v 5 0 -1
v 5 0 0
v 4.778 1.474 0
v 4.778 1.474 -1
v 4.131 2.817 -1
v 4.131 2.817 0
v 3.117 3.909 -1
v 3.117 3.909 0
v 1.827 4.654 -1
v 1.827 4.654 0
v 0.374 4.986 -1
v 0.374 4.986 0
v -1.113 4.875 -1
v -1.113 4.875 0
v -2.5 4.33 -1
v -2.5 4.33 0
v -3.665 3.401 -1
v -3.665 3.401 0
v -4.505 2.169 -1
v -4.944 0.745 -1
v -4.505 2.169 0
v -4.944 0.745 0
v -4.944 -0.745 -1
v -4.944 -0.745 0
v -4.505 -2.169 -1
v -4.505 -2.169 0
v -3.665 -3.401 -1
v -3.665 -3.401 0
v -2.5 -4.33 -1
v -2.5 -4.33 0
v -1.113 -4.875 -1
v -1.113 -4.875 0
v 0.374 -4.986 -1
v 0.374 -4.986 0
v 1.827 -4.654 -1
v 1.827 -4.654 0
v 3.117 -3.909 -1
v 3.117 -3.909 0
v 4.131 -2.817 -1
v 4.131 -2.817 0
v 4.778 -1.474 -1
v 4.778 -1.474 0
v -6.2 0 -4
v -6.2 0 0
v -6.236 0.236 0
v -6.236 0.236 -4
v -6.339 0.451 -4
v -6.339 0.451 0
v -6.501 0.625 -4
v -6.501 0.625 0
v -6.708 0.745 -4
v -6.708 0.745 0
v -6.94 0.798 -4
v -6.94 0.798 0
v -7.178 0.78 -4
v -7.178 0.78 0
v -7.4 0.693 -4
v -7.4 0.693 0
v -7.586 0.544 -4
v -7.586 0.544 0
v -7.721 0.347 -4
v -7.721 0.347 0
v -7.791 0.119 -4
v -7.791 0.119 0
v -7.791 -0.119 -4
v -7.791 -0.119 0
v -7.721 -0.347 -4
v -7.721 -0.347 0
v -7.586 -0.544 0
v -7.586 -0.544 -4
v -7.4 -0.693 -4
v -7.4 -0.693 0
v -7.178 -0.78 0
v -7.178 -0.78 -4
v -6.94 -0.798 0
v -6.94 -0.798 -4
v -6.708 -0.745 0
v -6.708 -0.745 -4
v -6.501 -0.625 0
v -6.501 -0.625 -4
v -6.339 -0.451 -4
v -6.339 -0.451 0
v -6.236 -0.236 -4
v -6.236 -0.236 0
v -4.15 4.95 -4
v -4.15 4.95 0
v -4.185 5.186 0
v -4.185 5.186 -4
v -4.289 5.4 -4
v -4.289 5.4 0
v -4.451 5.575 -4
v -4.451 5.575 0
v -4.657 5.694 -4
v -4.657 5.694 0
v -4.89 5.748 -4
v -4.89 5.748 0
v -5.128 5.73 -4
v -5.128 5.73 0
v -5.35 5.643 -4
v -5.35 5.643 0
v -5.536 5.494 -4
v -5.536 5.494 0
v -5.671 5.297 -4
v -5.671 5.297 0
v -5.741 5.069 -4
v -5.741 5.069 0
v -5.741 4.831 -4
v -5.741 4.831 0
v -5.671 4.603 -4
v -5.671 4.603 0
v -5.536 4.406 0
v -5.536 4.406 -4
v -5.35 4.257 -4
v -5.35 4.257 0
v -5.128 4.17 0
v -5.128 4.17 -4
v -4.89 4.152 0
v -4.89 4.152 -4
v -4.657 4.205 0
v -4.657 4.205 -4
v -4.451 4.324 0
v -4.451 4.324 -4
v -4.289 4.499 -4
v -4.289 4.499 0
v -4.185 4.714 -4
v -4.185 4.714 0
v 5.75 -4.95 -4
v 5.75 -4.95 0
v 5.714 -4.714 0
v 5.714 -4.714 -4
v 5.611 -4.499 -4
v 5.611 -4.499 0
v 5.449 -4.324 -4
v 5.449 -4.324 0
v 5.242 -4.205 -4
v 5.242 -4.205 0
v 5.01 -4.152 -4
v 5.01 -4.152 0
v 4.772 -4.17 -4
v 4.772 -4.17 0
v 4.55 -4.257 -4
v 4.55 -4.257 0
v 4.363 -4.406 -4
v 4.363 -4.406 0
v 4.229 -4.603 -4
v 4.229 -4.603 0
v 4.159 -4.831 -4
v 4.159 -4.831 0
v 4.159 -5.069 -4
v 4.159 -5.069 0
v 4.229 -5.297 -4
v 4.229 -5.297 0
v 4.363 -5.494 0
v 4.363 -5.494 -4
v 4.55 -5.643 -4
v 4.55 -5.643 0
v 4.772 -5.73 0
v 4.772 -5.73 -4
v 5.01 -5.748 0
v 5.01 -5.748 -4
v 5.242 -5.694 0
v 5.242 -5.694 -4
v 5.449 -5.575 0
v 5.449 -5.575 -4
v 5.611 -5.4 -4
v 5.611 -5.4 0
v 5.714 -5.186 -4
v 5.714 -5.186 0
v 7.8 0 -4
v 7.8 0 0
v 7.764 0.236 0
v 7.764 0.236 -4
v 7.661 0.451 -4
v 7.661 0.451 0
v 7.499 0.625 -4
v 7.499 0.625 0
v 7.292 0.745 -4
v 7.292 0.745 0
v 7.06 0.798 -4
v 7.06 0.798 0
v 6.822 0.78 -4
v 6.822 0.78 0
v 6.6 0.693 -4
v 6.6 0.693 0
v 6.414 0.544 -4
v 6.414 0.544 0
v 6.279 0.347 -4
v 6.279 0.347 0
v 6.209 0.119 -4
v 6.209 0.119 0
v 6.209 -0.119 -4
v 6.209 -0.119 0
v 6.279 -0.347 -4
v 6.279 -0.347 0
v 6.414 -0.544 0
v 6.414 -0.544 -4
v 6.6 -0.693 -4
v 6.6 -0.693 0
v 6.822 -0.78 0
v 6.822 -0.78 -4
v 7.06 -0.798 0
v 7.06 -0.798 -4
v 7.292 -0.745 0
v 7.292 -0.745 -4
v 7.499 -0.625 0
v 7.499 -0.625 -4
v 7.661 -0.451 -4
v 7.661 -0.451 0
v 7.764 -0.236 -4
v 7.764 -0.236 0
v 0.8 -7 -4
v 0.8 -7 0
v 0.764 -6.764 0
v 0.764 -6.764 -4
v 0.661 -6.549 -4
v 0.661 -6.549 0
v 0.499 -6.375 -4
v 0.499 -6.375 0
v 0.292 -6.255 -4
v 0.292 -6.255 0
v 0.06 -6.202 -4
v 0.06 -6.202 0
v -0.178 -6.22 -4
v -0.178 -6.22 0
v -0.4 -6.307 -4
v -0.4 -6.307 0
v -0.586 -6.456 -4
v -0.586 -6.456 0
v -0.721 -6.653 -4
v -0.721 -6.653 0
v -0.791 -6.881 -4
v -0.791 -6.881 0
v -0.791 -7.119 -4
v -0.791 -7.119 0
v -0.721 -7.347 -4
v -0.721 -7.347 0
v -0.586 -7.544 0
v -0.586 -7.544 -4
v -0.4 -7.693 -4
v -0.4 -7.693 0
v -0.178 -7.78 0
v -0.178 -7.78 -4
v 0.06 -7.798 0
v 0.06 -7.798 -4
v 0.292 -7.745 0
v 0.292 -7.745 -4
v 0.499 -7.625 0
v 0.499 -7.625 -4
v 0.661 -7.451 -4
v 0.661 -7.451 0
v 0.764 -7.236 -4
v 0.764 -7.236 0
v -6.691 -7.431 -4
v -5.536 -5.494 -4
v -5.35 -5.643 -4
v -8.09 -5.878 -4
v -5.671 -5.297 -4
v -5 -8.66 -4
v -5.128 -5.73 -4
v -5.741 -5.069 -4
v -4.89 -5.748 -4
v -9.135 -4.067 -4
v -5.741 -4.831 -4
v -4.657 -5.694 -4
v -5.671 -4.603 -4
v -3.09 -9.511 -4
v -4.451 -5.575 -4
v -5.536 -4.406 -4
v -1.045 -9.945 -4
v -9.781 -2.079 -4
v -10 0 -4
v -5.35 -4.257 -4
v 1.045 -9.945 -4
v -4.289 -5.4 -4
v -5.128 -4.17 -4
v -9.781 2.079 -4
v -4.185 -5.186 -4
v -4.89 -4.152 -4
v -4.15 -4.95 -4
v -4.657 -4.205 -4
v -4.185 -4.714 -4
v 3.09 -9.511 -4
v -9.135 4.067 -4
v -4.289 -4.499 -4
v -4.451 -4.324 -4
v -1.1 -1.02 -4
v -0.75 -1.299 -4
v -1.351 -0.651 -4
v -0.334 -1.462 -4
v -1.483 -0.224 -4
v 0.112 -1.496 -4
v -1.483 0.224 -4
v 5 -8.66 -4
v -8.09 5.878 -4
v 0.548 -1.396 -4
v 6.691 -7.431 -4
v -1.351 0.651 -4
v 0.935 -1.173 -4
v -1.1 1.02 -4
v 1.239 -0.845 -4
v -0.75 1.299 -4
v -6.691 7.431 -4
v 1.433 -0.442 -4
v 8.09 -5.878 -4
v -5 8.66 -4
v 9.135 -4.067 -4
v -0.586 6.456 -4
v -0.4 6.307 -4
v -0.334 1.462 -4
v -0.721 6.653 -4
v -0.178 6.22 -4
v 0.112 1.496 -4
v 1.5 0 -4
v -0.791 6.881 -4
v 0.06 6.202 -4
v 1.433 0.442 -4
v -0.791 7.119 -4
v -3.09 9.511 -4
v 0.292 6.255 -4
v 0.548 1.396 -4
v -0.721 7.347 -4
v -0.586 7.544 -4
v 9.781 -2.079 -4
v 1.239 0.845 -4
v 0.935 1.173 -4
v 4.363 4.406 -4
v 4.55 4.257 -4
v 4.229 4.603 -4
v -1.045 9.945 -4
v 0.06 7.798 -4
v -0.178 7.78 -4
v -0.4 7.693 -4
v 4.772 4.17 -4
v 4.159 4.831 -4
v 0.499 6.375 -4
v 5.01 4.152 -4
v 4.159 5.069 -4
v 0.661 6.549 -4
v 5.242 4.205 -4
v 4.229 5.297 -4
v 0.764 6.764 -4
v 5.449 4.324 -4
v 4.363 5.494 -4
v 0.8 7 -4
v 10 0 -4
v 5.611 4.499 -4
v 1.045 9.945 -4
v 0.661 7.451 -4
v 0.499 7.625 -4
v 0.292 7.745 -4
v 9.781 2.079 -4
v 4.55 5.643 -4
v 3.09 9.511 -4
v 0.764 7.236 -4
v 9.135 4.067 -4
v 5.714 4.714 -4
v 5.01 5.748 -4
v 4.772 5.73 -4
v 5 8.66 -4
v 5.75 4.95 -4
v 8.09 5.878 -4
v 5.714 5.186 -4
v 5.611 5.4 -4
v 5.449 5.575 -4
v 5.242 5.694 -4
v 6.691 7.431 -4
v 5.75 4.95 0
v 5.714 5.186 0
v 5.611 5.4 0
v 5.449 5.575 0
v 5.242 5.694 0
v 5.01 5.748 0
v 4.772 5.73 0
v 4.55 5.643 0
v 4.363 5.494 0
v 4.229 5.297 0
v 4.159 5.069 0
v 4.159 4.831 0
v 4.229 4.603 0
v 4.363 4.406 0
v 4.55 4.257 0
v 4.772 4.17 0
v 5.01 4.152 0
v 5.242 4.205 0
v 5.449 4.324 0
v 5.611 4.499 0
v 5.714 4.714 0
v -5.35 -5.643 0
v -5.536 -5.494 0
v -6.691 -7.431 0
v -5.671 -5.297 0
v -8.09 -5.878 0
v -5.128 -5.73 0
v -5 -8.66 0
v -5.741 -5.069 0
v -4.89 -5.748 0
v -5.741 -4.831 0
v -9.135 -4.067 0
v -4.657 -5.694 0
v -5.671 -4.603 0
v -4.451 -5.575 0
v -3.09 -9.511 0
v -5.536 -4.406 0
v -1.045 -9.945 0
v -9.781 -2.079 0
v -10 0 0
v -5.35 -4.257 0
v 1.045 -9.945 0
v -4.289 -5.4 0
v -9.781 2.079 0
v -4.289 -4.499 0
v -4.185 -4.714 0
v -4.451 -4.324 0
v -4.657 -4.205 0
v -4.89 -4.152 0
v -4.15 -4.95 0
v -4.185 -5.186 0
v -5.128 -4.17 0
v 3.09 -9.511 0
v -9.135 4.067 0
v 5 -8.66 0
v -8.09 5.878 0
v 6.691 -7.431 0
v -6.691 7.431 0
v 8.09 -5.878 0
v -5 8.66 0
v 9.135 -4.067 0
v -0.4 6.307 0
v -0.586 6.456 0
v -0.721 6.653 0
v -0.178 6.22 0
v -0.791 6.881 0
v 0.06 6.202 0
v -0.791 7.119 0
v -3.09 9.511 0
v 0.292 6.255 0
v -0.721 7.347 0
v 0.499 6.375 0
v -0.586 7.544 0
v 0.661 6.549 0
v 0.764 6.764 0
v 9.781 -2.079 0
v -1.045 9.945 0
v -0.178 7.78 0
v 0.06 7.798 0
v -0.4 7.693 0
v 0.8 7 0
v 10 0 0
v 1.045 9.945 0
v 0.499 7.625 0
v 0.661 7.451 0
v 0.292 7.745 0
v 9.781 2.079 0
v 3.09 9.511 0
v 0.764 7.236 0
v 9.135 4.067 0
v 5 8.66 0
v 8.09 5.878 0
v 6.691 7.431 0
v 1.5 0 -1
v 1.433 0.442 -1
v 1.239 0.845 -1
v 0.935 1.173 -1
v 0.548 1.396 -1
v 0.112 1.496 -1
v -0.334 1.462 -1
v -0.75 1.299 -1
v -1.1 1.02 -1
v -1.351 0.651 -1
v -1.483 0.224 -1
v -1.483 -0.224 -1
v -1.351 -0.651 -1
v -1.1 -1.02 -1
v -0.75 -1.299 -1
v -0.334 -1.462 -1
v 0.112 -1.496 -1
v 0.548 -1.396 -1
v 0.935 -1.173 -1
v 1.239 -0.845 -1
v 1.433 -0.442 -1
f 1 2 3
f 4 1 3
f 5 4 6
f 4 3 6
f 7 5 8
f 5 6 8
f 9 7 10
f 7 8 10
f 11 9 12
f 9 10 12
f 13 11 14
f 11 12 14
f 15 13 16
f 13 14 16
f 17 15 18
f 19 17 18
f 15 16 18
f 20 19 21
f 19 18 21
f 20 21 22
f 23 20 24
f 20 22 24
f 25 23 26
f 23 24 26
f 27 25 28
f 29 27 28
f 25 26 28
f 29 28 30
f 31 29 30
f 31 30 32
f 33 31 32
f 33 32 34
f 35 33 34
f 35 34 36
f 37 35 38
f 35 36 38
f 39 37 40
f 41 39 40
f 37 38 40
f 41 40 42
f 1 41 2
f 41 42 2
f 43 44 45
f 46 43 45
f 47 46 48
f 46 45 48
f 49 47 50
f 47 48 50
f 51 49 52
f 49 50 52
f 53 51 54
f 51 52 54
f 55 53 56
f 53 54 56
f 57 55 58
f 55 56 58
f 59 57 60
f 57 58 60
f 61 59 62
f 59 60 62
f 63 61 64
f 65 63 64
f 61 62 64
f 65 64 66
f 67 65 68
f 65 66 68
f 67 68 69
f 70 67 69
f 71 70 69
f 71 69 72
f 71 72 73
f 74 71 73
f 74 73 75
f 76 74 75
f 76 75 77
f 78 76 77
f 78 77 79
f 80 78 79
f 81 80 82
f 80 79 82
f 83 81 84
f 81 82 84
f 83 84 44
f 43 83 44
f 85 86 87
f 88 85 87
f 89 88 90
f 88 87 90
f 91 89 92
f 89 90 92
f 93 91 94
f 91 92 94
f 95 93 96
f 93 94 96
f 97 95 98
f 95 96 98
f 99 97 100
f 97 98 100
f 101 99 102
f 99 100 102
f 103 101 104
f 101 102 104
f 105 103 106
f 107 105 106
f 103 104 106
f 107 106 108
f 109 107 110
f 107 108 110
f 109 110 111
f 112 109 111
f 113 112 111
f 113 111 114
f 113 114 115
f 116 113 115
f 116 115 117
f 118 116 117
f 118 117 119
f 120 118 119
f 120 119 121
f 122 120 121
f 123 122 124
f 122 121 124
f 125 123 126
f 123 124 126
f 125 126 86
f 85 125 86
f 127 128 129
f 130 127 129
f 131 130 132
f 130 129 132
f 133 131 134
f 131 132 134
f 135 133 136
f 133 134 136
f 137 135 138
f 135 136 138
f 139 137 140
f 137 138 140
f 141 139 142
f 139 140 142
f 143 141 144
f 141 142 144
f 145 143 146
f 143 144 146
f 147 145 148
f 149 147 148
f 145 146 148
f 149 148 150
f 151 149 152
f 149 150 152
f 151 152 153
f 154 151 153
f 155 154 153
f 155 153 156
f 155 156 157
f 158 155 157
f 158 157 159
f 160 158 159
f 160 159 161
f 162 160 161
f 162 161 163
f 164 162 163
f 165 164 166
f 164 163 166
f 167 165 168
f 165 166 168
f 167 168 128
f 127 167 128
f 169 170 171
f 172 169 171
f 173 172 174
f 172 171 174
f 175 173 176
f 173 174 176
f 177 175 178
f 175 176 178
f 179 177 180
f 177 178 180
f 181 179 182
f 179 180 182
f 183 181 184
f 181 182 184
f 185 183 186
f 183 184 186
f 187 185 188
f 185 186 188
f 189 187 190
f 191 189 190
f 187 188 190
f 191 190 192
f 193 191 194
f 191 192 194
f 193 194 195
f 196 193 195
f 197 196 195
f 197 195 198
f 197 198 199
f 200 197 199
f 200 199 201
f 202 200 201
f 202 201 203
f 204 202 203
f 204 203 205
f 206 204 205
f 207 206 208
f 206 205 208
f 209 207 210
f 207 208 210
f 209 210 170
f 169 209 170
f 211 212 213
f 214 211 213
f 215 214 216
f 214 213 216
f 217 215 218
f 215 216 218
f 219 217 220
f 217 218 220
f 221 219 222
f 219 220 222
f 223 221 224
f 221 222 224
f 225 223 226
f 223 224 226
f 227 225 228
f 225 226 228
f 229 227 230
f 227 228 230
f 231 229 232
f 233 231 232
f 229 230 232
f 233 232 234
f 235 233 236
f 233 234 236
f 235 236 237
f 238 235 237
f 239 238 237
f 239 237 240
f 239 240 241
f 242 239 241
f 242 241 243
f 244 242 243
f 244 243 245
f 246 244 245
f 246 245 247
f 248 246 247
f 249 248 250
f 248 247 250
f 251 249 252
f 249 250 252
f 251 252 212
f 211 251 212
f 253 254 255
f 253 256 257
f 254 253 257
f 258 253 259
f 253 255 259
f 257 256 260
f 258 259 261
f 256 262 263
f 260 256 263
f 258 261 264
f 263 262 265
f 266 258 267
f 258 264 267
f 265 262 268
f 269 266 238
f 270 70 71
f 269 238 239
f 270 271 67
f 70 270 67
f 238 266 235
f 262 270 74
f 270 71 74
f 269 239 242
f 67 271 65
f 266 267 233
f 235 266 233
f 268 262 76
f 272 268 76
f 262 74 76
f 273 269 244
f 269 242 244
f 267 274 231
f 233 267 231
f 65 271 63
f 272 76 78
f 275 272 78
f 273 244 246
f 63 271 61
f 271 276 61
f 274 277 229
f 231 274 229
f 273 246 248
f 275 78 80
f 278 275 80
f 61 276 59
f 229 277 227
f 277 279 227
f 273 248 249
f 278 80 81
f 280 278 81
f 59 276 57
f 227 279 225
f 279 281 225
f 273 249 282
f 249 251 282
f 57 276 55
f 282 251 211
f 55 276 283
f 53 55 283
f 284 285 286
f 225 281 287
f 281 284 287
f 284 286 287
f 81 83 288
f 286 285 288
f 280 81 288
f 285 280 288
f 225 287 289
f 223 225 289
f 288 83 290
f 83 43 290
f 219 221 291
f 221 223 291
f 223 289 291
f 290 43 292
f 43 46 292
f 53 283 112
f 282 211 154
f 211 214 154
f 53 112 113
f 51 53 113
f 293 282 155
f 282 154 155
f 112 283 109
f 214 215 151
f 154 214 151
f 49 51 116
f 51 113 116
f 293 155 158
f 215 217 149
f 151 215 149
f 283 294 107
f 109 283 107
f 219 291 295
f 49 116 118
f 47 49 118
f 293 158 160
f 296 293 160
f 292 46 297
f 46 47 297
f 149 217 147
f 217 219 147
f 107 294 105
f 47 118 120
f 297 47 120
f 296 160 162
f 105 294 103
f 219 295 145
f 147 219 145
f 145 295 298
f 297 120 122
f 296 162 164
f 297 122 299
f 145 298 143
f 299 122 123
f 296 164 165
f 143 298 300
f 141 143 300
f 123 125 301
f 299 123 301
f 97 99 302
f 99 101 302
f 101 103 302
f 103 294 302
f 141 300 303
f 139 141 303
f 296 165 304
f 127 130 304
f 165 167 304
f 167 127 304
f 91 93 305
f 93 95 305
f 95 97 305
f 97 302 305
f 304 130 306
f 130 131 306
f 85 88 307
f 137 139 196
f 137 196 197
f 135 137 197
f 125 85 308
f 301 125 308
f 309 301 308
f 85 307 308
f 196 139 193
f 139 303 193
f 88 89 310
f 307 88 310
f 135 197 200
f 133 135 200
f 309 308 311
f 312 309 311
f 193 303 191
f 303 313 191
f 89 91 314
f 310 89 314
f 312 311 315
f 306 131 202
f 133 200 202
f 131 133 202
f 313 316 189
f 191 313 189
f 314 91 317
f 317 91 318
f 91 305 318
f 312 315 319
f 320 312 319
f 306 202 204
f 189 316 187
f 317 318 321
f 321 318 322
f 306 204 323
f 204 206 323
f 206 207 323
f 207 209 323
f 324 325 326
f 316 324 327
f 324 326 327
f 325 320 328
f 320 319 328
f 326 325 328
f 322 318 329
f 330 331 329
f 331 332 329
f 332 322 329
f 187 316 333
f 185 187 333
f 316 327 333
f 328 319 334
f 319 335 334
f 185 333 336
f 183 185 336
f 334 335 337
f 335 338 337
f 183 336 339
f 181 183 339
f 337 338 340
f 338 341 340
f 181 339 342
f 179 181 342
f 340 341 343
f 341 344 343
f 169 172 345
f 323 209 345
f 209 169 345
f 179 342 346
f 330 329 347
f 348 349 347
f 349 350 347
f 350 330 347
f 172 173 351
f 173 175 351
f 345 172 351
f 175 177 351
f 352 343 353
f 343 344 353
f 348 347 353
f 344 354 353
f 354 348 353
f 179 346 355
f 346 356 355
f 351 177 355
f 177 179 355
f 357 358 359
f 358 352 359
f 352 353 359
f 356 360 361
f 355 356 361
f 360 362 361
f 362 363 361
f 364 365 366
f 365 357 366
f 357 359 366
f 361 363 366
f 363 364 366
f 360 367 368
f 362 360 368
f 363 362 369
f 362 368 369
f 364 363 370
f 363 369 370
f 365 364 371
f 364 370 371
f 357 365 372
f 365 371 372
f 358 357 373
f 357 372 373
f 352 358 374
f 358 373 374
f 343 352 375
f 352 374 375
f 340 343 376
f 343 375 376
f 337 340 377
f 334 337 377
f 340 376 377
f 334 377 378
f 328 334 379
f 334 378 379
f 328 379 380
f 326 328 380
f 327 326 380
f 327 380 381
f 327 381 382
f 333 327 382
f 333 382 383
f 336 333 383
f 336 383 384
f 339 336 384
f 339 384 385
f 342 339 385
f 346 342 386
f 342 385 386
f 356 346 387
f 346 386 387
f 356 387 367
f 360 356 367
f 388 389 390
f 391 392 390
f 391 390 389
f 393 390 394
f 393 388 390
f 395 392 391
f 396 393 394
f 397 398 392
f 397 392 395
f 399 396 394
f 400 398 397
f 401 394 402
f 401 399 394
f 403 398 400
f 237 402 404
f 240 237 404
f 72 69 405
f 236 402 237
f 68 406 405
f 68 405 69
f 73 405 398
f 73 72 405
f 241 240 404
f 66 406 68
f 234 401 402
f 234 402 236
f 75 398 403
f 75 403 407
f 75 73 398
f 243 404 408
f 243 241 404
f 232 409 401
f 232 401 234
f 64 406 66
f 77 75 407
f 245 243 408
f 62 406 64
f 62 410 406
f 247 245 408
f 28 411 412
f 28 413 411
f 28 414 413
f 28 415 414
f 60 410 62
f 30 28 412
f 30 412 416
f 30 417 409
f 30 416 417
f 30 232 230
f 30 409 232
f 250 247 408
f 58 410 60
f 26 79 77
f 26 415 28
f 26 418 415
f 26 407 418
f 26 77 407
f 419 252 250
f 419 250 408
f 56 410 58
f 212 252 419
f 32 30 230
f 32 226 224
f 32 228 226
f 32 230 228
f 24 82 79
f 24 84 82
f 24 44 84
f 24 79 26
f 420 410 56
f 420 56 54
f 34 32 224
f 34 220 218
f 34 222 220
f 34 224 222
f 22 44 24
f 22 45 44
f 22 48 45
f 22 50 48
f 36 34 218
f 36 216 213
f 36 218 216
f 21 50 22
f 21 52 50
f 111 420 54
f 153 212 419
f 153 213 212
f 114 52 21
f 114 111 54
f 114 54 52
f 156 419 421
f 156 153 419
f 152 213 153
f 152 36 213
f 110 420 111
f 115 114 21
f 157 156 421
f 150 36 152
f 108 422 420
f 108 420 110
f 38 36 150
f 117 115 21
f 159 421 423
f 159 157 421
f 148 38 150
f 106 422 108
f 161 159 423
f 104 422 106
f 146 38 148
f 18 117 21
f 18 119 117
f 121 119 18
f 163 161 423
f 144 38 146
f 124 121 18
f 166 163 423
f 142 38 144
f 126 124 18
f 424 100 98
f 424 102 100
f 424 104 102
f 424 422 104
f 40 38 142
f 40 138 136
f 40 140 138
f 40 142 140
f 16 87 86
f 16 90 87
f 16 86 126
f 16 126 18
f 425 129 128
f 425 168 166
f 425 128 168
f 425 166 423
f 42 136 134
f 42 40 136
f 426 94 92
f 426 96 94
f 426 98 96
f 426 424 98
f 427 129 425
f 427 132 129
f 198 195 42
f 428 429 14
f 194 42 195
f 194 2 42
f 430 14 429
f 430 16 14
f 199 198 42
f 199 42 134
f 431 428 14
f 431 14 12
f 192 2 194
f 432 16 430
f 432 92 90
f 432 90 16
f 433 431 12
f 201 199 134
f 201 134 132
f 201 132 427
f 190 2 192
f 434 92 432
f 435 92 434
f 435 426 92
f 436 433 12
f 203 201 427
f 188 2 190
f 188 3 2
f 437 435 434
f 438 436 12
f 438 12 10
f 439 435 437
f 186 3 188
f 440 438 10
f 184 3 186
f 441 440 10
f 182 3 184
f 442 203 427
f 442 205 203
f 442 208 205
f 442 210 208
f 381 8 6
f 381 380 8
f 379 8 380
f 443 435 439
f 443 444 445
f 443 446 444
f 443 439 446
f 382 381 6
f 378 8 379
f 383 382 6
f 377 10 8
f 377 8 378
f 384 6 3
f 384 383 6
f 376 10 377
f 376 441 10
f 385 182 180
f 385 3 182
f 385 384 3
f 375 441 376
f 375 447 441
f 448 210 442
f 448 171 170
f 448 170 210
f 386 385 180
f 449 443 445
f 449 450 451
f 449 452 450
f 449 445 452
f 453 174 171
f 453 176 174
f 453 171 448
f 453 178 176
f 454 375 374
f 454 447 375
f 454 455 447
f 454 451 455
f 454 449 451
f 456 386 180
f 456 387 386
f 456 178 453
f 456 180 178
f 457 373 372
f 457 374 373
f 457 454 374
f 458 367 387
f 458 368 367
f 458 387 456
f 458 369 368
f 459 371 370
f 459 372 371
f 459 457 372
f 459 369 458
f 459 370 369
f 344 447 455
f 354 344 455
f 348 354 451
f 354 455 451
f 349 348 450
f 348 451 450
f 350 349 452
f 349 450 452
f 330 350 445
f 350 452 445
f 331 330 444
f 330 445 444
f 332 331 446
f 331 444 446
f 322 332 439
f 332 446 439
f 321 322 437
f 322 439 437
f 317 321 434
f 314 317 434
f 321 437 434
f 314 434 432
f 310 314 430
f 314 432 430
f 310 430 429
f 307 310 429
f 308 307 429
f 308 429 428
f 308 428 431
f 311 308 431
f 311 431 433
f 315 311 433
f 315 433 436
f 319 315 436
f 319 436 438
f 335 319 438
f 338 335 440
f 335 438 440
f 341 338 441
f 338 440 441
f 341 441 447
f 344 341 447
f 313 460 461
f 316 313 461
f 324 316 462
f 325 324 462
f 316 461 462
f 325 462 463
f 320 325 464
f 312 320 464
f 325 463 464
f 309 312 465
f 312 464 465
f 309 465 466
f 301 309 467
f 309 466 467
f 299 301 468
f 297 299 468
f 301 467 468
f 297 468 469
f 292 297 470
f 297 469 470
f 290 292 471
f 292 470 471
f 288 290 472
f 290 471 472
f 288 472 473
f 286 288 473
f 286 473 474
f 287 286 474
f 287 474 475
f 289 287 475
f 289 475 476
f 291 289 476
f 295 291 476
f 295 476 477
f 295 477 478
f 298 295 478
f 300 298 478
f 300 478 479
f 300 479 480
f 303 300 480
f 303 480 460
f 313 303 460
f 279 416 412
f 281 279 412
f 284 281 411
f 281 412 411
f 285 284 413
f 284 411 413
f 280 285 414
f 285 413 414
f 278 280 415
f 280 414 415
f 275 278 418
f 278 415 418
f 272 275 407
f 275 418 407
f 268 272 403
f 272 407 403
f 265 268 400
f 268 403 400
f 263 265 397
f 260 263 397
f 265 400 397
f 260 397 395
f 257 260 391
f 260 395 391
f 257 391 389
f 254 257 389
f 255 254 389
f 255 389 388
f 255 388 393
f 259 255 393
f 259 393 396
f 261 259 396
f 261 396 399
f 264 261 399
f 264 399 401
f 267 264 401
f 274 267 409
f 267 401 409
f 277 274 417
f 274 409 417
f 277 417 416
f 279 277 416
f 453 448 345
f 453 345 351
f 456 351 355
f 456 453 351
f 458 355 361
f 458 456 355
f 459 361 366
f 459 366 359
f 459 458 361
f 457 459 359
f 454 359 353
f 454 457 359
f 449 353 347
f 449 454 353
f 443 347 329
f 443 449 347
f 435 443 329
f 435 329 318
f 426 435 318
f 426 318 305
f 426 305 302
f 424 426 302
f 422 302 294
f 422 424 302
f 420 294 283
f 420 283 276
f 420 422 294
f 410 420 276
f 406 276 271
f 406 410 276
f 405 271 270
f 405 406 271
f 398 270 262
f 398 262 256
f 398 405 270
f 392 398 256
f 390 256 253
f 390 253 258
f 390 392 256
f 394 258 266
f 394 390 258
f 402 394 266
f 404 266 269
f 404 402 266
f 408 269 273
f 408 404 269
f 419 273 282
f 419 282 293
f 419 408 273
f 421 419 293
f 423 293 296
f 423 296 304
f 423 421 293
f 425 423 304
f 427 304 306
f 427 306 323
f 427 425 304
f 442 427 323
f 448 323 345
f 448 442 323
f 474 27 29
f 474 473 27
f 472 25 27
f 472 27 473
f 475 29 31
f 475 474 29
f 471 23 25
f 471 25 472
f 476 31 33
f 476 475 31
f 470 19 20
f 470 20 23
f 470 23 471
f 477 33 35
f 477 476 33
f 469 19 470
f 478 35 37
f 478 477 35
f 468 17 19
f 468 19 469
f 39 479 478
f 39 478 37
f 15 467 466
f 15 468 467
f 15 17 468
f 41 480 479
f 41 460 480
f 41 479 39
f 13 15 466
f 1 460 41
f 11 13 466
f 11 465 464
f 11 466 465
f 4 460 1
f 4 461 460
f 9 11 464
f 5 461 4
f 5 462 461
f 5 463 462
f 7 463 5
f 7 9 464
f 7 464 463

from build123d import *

# Parameters (mm, degrees)
F0_R     = 10
F0_R_2   = 0.8
F0_R_3   = 5
F0_R_4   = 1.5
F1_DEPTH = 4
F2_DEPTH = 1


with BuildPart() as f1:
    # F0 (on Top) → F1 (new body)
    with BuildSketch(Plane.XY):
        Circle(F0_R)
        with Locations((-4.949747, -4.949747)):
            Circle(F0_R_2, mode=Mode.SUBTRACT)
        with Locations((0, -7)):
            Circle(F0_R_2, mode=Mode.SUBTRACT)
        with Locations((4.949747, -4.949747)):
            Circle(F0_R_2, mode=Mode.SUBTRACT)
        with Locations((-7, 0)):
            Circle(F0_R_2, mode=Mode.SUBTRACT)
        with Locations((-4.949747, 4.949747)):
            Circle(F0_R_2, mode=Mode.SUBTRACT)
        Circle(F0_R_3, mode=Mode.SUBTRACT)
        with Locations((4.949747, 4.949747)):
            Circle(F0_R_2, mode=Mode.SUBTRACT)
        with Locations((7, 0)):
            Circle(F0_R_2, mode=Mode.SUBTRACT)
        with Locations((0, 7)):
            Circle(F0_R_2, mode=Mode.SUBTRACT)
        Circle(F0_R_3)
        Circle(F0_R_4, mode=Mode.SUBTRACT)
    extrude(amount=-F1_DEPTH)

    # F0 (on Top) → F2 (cut)
    with BuildSketch(Plane.XY):
        Circle(F0_R_3)
        Circle(F0_R_4, mode=Mode.SUBTRACT)
    extrude(amount=-F2_DEPTH, mode=Mode.SUBTRACT)


solid = f1.part
